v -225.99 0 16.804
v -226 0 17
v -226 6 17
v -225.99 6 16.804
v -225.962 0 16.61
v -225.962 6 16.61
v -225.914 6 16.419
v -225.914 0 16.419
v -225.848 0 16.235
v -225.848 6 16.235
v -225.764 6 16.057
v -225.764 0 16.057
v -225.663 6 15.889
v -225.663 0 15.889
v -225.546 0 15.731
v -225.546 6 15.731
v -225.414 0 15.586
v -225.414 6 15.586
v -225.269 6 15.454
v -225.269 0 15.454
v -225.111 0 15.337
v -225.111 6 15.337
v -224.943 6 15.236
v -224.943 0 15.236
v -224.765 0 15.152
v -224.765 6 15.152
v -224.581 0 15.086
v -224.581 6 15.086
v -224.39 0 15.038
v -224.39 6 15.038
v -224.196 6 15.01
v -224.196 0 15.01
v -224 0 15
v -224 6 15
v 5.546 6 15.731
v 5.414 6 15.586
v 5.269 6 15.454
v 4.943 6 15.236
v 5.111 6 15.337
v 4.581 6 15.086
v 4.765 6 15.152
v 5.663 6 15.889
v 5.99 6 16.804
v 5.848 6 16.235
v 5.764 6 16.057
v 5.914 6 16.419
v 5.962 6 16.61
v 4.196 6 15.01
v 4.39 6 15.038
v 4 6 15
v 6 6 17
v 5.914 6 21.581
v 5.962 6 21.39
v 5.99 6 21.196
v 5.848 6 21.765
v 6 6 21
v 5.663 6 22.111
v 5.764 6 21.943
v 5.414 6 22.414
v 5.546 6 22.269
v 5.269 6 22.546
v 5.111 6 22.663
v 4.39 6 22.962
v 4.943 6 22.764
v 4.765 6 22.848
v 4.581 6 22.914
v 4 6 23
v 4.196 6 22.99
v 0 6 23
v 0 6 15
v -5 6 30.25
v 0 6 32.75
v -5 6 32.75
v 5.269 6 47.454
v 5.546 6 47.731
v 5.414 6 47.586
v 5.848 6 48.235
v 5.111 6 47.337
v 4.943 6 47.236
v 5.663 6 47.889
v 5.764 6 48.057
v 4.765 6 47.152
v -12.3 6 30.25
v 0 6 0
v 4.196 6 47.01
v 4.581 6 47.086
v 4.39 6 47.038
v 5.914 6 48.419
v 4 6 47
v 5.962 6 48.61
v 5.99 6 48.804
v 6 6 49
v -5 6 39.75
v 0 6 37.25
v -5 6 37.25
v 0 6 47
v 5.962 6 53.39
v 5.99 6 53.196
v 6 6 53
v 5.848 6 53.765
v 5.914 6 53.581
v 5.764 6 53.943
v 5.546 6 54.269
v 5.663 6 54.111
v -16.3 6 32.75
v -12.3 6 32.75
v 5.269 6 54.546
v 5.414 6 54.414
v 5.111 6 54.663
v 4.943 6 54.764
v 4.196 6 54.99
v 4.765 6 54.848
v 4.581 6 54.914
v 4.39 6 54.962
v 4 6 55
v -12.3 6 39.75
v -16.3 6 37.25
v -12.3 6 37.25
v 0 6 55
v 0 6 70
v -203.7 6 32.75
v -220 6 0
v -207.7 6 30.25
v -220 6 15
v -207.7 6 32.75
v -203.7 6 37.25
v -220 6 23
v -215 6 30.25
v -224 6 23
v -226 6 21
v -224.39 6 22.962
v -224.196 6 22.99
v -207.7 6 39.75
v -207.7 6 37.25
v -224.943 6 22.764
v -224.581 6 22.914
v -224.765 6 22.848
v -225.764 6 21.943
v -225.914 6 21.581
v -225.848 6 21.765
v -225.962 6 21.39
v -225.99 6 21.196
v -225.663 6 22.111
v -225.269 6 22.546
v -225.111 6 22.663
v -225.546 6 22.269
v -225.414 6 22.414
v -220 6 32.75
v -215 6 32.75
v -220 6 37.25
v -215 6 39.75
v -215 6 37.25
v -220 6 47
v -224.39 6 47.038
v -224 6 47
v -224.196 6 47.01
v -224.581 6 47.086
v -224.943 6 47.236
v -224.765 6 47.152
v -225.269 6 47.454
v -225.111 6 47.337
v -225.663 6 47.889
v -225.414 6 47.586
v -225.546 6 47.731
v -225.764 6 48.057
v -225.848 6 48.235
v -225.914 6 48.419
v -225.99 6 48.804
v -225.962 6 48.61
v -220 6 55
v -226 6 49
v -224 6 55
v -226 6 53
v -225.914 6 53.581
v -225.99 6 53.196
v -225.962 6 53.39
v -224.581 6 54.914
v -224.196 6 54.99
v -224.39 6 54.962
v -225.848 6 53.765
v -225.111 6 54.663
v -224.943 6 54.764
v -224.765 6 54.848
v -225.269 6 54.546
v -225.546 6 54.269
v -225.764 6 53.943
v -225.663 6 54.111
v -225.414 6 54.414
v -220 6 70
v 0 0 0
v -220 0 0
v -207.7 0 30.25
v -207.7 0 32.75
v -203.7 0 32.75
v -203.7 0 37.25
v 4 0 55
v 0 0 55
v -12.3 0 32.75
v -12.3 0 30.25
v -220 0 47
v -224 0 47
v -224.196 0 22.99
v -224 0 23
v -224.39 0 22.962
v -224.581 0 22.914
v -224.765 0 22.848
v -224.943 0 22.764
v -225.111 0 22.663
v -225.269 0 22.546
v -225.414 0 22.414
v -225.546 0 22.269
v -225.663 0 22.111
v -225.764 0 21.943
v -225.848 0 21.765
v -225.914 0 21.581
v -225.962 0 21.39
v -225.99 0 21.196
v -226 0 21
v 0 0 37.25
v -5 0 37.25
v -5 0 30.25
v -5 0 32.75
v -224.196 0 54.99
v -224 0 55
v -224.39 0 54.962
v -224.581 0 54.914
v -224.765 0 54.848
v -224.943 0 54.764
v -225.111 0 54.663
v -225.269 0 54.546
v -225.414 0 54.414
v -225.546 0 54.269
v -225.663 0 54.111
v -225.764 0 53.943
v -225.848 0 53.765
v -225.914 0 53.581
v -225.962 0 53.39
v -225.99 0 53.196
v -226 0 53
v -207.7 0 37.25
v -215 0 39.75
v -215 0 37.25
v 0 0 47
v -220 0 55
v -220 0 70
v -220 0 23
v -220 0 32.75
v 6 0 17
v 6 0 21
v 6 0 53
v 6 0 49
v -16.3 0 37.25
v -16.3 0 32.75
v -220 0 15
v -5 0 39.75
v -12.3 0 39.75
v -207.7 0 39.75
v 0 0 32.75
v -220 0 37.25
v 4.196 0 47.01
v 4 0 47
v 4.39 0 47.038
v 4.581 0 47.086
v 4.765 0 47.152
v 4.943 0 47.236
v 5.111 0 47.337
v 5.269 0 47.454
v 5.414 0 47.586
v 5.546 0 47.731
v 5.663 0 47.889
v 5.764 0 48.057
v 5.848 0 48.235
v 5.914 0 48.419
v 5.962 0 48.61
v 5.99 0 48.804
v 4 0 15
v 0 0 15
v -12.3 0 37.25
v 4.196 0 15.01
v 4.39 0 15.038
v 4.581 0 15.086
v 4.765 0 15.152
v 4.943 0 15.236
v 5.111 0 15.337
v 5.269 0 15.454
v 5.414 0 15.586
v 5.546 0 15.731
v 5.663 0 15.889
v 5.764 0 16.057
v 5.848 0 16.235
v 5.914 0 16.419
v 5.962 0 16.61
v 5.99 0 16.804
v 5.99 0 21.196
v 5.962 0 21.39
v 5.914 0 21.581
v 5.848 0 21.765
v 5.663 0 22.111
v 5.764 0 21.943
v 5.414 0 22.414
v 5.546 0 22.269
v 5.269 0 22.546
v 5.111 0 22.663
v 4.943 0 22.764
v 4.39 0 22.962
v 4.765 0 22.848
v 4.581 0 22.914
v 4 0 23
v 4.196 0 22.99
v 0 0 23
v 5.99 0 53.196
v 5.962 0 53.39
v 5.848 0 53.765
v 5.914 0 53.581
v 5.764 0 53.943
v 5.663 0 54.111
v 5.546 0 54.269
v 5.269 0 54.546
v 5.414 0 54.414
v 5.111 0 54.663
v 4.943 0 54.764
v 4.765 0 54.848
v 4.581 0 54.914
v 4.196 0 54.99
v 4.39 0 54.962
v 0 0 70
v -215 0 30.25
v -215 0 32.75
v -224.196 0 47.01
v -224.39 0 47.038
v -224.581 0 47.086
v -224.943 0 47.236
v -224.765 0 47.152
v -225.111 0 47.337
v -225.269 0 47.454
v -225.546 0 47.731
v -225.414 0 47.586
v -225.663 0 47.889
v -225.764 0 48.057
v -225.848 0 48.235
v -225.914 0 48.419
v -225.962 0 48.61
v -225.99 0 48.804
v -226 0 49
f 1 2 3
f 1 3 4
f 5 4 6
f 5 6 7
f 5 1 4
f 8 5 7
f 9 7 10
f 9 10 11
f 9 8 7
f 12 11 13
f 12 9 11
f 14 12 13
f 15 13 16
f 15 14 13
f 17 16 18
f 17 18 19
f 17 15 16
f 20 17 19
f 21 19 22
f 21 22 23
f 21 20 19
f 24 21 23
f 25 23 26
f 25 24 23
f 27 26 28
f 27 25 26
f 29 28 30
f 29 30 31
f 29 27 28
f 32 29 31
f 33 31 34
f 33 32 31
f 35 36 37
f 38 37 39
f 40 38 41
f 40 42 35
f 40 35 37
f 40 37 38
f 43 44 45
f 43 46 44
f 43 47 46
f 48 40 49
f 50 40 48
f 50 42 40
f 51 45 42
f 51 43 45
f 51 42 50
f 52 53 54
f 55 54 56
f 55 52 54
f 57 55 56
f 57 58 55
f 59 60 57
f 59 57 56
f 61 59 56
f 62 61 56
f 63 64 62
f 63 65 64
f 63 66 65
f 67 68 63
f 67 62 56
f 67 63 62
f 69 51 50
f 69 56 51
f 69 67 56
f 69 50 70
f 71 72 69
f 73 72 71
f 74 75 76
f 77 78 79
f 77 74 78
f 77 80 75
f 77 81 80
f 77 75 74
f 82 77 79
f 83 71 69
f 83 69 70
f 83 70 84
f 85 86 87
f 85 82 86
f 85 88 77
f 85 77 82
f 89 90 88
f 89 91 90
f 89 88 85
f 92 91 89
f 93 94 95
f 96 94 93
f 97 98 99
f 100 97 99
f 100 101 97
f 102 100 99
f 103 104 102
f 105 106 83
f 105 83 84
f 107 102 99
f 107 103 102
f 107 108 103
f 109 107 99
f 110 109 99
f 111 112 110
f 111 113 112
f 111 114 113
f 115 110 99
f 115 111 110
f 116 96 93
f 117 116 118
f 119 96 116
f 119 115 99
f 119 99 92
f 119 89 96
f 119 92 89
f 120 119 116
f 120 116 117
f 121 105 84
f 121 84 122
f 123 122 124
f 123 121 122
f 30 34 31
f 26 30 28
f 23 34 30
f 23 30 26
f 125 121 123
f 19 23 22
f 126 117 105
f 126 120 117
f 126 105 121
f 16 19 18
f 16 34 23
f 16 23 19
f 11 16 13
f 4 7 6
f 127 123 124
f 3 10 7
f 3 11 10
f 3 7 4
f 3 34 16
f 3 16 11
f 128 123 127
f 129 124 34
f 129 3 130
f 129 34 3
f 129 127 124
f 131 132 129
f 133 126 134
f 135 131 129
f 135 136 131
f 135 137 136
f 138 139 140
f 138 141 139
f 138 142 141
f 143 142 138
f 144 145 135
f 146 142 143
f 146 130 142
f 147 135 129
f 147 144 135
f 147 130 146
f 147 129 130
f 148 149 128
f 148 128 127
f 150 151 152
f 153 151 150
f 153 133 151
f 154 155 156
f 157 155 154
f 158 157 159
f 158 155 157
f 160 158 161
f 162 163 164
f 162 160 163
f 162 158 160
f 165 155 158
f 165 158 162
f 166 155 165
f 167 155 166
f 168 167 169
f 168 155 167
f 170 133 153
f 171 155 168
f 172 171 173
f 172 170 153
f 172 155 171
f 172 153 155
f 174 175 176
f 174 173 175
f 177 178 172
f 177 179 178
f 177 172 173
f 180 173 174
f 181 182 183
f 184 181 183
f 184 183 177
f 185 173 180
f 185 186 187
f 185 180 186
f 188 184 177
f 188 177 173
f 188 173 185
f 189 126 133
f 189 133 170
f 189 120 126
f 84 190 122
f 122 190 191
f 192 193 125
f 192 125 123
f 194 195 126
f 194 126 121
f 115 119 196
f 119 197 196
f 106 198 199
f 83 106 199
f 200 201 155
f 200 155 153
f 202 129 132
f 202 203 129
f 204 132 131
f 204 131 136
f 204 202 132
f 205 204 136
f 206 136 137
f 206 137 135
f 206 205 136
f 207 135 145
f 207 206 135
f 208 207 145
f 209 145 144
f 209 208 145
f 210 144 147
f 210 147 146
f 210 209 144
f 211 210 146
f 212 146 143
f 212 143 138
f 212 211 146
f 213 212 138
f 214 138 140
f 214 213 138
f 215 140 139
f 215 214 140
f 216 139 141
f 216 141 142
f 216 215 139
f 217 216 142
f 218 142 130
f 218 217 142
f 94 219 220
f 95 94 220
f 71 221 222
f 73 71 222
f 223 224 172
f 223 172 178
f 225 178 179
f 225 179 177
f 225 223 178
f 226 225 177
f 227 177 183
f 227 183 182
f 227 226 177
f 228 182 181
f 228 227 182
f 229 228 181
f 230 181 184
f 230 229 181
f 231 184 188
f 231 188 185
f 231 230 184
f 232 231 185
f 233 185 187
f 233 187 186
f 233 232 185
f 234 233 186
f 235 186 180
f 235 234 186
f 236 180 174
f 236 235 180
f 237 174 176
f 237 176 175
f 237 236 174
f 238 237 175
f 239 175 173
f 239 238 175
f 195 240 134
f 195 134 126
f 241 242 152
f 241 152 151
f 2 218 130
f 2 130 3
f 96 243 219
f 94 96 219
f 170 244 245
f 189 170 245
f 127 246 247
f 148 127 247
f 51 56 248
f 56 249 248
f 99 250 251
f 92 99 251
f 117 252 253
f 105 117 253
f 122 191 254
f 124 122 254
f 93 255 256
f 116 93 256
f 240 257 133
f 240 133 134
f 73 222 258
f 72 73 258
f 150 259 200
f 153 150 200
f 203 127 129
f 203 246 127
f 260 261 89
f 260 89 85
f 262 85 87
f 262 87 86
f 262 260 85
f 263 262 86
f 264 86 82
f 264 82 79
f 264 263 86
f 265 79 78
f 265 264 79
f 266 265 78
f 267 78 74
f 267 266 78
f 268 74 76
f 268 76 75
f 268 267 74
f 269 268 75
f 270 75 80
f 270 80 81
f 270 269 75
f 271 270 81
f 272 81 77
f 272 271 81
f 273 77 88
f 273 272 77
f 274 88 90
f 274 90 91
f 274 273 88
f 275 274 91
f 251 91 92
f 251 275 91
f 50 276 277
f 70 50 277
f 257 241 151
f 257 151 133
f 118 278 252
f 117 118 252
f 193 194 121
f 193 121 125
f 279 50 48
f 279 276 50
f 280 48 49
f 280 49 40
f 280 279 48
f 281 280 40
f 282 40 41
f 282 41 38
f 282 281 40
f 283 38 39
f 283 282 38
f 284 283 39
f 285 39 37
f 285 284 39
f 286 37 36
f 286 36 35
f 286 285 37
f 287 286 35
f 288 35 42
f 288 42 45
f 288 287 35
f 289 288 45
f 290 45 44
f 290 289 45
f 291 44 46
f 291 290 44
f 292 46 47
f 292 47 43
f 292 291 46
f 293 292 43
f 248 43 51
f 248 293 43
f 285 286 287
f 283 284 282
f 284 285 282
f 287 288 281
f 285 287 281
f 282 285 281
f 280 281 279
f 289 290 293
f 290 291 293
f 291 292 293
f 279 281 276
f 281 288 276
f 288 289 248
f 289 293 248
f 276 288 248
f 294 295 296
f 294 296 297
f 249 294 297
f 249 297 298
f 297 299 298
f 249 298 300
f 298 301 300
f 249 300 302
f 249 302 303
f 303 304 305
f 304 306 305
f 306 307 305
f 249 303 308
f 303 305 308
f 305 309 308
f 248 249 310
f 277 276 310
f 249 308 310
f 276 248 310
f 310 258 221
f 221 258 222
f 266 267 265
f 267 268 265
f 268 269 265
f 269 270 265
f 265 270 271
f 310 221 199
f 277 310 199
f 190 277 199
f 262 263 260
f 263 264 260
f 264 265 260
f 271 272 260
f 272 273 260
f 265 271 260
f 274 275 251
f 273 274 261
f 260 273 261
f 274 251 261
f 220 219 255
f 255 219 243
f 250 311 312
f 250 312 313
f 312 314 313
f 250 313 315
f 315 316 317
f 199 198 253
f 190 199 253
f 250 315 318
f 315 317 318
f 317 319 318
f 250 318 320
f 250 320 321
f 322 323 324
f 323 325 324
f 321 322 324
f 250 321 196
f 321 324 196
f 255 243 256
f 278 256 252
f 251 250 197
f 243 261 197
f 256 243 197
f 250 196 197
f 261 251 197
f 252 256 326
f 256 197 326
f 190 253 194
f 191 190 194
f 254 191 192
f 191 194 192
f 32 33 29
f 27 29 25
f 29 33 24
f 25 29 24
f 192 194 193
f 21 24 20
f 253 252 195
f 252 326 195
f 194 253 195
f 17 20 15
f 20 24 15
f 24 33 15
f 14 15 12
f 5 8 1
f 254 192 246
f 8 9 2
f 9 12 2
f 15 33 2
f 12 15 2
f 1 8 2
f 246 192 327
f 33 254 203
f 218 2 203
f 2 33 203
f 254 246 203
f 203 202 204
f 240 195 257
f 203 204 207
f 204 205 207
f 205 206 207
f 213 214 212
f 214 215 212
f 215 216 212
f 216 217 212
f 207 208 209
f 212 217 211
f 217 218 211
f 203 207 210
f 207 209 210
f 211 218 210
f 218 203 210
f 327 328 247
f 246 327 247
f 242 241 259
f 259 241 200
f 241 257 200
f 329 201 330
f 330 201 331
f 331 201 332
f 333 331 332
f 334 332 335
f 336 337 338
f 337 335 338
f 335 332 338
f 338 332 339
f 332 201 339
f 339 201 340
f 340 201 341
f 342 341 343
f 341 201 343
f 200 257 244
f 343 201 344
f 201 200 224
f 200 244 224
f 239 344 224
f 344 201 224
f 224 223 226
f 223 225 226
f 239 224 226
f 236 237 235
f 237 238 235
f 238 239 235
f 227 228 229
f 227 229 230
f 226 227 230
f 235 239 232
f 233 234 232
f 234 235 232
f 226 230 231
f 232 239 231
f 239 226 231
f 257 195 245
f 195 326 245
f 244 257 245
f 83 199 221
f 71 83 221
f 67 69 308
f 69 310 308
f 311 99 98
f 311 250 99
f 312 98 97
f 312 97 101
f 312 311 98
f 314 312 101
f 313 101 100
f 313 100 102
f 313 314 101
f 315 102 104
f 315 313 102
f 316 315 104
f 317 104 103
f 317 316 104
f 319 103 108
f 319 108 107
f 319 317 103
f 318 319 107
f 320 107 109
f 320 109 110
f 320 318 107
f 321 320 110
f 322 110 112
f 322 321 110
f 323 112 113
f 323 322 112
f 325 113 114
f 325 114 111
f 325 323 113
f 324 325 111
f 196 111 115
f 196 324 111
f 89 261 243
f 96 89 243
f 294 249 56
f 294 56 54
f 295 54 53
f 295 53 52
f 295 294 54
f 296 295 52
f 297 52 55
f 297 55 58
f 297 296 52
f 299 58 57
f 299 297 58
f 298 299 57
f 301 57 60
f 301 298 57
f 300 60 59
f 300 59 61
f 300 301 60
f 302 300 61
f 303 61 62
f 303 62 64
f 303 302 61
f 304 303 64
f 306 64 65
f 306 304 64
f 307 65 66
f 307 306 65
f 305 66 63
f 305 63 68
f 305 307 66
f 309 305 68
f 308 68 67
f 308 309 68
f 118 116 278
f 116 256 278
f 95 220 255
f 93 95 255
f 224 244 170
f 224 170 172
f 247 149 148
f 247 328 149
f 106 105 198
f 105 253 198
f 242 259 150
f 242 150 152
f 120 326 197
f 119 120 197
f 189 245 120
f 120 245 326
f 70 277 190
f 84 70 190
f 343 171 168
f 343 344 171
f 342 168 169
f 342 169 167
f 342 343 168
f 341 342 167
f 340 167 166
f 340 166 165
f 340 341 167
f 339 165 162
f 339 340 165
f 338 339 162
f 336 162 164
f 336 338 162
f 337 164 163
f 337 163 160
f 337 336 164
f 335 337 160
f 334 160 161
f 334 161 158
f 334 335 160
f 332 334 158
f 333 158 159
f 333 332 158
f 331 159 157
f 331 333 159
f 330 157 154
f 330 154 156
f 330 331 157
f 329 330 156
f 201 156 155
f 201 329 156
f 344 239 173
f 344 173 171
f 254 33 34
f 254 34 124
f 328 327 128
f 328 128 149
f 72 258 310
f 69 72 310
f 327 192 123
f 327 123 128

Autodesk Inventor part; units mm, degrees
ref_plane "YZ Plane" through (0, 0, 0) normal (1, 0, 0) x (0, 1, 0)
ref_plane "XZ Plane" through (0, 0, 0) normal (0, 1, 0) x (-1, 0, 0)
ref_plane "XY Plane" through (0, 0, 0) normal (0, 0, 1) x (1, 0, 0)
sketch "Sketch1" plane through (0, 0, 0) normal (0, 1, 0) x (-1, 0, 0)
  line L0 (0, 0) -> (220, 0)
  line L1 (220, 0) -> (220, 70)
  line L2 (220, 70) -> (0, 70)
  line L3 (0, 70) -> (0, 0)
  dimension "d11" = 220
  dimension "d16" = 70
extrude "Extrusion3" add sketch "Sketch1" along normal blind 6
sketch "Sketch5" plane through (0, 0, 0) normal (0, -1, 0) x (1, 0, 0)
  line L0 (0, 0) -> (-220, 0) projected
  line L1 (0, 70) -> (0, 0) projected
  line L2 (-220, 70) -> (0, 70) projected
  line L3 (-220, 0) -> (-220, 70) projected
  line L4 (-220, 55) -> (-224, 55)
  line L5 (-226, 53) -> (-226, 49)
  line L6 (-224, 47) -> (-220, 47)
  line L7 (-220, 47) -> (-220, 55)
  line L8 (-220, 23) -> (-224, 23)
  line L9 (-226, 21) -> (-226, 17)
  line L10 (-224, 15) -> (-220, 15)
  line L11 (-220, 15) -> (-220, 23)
  line L12 (0, 55) -> (4, 55)
  line L13 (6, 53) -> (6, 49)
  line L14 (4, 47) -> (0, 47)
  line L15 (0, 47) -> (0, 55)
  line L16 (0, 23) -> (4, 23)
  line L17 (6, 21) -> (6, 17)
  line L18 (4, 15) -> (0, 15)
  line L19 (0, 15) -> (0, 23)
  arc A0 (-224, 55) -> (-226, 53) centre (-224, 53) ccw
  arc A1 (-226, 49) -> (-224, 47) centre (-224, 49) ccw
  arc A2 (-224, 23) -> (-226, 21) centre (-224, 21) ccw
  arc A3 (-226, 17) -> (-224, 15) centre (-224, 17) ccw
  arc A4 (4, 47) -> (6, 49) centre (4, 49) ccw
  arc A5 (6, 53) -> (4, 55) centre (4, 53) ccw
  arc A6 (6, 21) -> (4, 23) centre (4, 21) ccw
  arc A7 (4, 15) -> (6, 17) centre (4, 17) ccw
  dimension "d61" = 2
  dimension "d62" = 8
  dimension "d63" = 8
  dimension "d64" = 6
  dimension "d65" = 15
  dimension "d66" = 15
  dimension "d67" = 6
extrude "Extrusion6" add sketch "Sketch5" against normal blind 6 contours L1 L16 A6 L17 A7 L18 | L10 A3 L9 A2 L8 L3 | L1 L12 A5 L13 A4 L14 | L6 A1 L5 A0 L4 L3
sketch "Sketch6" plane through (0, 0, 0) normal (0, -1, 0) x (1, 0, 0)
  line L0 (0, 0) -> (-220, 0) projected
  line L1 (-220, 70) -> (0, 70) projected
  line L2 (-220, 23) -> (-220, 47) projected
  line L3 (-110, 70) -> (-110, 0) construction
  line L4 (-203.7, 37.25) -> (-203.7, 32.75)
  line L5 (-220, 32.75) -> (-220, 37.25)
  line L6 (-215, 39.75) -> (-207.7, 39.75)
  line L7 (-207.7, 30.25) -> (-215, 30.25)
  line L8 (-220, 37.25) -> (-215, 37.25)
  line L9 (-207.7, 37.25) -> (-203.7, 37.25)
  line L10 (-203.7, 32.75) -> (-207.7, 32.75)
  line L11 (-215, 32.75) -> (-220, 32.75)
  line L12 (-215, 30.25) -> (-215, 32.75)
  line L13 (-215, 37.25) -> (-215, 39.75)
  line L14 (-207.7, 39.75) -> (-207.7, 37.25)
  line L15 (-207.7, 32.75) -> (-207.7, 30.25)
  line L16 (-16.3, 37.25) -> (-16.3, 32.75)
  line L17 (0, 32.75) -> (0, 37.25)
  line L18 (-5, 39.75) -> (-12.3, 39.75)
  line L19 (-12.3, 30.25) -> (-5, 30.25)
  line L20 (0, 37.25) -> (-5, 37.25)
  line L21 (-12.3, 37.25) -> (-16.3, 37.25)
  line L22 (-16.3, 32.75) -> (-12.3, 32.75)
  line L23 (-5, 32.75) -> (0, 32.75)
  line L24 (-5, 30.25) -> (-5, 32.75)
  line L25 (-5, 37.25) -> (-5, 39.75)
  line L26 (-12.3, 39.75) -> (-12.3, 37.25)
  line L27 (-12.3, 32.75) -> (-12.3, 30.25)
  point P0 (-220, 35)
  point P1 (0, 35)
  dimension "d70" = 2.5
  dimension "d71" = 2.5
  dimension "d72" = 4.5
  dimension "d73" = 5
  dimension "d74" = 7.3
  dimension "d75" = 4
extrude "Extrusion7" cut sketch "Sketch6" against normal blind 6
equation "\"d66\" = d65"
equation "\"d71\" = d70"
properties part number "front_panel_2004_bottom"
